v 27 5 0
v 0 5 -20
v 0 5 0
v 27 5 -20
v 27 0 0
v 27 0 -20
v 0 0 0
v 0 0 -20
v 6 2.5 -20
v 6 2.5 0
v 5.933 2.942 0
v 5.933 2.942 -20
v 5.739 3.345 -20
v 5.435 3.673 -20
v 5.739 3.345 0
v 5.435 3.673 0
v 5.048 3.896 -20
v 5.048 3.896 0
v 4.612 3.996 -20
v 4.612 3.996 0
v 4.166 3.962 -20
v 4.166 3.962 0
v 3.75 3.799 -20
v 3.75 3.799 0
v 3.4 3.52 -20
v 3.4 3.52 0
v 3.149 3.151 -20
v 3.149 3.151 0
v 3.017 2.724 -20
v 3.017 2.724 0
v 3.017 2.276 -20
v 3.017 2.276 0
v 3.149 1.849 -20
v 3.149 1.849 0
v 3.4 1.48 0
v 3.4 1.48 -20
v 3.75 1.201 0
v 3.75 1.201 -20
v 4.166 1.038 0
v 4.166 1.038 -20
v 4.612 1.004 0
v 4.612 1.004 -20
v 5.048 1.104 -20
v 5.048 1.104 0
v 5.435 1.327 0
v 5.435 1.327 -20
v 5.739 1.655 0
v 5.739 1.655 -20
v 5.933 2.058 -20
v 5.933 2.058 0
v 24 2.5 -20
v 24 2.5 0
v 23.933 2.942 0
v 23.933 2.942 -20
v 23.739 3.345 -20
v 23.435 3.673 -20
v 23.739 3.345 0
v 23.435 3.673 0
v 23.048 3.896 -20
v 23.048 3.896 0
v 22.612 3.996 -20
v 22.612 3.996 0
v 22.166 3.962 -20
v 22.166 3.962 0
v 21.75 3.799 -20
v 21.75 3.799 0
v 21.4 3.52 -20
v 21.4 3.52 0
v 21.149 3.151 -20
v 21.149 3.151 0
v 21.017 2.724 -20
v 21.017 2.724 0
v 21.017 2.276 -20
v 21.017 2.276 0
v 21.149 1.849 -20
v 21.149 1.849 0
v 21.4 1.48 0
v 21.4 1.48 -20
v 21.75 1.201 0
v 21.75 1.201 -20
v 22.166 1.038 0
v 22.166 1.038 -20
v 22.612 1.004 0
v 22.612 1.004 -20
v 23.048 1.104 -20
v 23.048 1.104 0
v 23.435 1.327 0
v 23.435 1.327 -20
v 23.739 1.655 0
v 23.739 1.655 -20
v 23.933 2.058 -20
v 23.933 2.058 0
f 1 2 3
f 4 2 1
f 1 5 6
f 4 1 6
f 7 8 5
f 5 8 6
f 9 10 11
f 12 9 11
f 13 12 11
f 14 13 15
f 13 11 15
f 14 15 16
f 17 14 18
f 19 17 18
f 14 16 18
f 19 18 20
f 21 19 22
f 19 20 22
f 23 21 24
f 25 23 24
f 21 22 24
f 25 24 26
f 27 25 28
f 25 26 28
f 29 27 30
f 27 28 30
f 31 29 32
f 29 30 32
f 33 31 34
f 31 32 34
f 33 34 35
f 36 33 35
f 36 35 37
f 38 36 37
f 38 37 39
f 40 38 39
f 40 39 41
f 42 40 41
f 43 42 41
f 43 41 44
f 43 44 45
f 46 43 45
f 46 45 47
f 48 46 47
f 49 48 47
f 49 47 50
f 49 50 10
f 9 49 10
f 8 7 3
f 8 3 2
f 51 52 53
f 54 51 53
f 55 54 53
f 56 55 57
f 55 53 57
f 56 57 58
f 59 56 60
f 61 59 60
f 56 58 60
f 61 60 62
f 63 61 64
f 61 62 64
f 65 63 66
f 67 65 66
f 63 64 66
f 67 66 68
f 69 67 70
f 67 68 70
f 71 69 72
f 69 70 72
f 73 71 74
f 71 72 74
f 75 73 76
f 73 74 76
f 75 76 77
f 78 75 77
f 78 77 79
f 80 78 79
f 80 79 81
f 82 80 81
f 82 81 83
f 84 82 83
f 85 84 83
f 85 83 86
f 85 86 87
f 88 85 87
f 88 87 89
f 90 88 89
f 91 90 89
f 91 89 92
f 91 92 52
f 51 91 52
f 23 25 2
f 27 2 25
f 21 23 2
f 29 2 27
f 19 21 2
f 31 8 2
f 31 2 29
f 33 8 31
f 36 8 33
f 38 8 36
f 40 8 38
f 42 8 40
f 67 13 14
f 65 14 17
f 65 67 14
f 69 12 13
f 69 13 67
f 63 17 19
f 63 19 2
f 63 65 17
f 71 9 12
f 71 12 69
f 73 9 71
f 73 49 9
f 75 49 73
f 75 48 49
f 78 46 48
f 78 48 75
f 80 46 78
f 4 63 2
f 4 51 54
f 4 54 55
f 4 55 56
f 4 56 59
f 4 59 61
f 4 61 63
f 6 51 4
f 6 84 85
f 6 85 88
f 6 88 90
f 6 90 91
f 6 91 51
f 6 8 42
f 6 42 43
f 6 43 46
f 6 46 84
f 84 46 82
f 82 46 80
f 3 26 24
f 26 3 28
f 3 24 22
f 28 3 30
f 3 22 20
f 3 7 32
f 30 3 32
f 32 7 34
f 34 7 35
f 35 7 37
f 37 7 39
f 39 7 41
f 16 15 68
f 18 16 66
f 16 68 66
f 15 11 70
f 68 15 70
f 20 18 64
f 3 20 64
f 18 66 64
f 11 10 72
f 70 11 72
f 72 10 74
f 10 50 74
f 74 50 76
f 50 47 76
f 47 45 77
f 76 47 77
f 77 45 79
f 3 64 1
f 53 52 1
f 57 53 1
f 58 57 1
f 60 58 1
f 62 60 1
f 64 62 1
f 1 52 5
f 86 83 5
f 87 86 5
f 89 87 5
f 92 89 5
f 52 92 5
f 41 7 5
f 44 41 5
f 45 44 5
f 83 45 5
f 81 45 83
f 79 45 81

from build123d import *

# Parameters (mm, degrees)
SKETCH1_W               = 27
SKETCH1_H               = 20
BOSS_EXTRUDE1_DEPTH     = 5
CUT_EXTRUDE1_DEPTH      = 1000
CUT_EXTRUDE1_DEPTH_BACK = 1000
SKETCH2_R               = 1.5


with BuildPart() as part:
    # Sketch1 → Boss-Extrude1 (new body)
    with BuildSketch(Plane(origin=(0, 0, 0), x_dir=(1, 0, 0), z_dir=(0, 1, 0))):
        with Locations((13.5, 10)):
            Rectangle(SKETCH1_W, SKETCH1_H)
    extrude(amount=BOSS_EXTRUDE1_DEPTH)

    # Sketch2 → Cut-Extrude1 (cut, two sides: drawn at the far end of the back side and taken through both)
    with BuildSketch(Plane.XY.offset(-CUT_EXTRUDE1_DEPTH_BACK)):
        with Locations((4.5, 2.5)):
            Circle(SKETCH2_R)
        with Locations((22.5, 2.5)):
            Circle(SKETCH2_R)
    extrude(amount=CUT_EXTRUDE1_DEPTH + CUT_EXTRUDE1_DEPTH_BACK, mode=Mode.SUBTRACT)


solid = part.part
